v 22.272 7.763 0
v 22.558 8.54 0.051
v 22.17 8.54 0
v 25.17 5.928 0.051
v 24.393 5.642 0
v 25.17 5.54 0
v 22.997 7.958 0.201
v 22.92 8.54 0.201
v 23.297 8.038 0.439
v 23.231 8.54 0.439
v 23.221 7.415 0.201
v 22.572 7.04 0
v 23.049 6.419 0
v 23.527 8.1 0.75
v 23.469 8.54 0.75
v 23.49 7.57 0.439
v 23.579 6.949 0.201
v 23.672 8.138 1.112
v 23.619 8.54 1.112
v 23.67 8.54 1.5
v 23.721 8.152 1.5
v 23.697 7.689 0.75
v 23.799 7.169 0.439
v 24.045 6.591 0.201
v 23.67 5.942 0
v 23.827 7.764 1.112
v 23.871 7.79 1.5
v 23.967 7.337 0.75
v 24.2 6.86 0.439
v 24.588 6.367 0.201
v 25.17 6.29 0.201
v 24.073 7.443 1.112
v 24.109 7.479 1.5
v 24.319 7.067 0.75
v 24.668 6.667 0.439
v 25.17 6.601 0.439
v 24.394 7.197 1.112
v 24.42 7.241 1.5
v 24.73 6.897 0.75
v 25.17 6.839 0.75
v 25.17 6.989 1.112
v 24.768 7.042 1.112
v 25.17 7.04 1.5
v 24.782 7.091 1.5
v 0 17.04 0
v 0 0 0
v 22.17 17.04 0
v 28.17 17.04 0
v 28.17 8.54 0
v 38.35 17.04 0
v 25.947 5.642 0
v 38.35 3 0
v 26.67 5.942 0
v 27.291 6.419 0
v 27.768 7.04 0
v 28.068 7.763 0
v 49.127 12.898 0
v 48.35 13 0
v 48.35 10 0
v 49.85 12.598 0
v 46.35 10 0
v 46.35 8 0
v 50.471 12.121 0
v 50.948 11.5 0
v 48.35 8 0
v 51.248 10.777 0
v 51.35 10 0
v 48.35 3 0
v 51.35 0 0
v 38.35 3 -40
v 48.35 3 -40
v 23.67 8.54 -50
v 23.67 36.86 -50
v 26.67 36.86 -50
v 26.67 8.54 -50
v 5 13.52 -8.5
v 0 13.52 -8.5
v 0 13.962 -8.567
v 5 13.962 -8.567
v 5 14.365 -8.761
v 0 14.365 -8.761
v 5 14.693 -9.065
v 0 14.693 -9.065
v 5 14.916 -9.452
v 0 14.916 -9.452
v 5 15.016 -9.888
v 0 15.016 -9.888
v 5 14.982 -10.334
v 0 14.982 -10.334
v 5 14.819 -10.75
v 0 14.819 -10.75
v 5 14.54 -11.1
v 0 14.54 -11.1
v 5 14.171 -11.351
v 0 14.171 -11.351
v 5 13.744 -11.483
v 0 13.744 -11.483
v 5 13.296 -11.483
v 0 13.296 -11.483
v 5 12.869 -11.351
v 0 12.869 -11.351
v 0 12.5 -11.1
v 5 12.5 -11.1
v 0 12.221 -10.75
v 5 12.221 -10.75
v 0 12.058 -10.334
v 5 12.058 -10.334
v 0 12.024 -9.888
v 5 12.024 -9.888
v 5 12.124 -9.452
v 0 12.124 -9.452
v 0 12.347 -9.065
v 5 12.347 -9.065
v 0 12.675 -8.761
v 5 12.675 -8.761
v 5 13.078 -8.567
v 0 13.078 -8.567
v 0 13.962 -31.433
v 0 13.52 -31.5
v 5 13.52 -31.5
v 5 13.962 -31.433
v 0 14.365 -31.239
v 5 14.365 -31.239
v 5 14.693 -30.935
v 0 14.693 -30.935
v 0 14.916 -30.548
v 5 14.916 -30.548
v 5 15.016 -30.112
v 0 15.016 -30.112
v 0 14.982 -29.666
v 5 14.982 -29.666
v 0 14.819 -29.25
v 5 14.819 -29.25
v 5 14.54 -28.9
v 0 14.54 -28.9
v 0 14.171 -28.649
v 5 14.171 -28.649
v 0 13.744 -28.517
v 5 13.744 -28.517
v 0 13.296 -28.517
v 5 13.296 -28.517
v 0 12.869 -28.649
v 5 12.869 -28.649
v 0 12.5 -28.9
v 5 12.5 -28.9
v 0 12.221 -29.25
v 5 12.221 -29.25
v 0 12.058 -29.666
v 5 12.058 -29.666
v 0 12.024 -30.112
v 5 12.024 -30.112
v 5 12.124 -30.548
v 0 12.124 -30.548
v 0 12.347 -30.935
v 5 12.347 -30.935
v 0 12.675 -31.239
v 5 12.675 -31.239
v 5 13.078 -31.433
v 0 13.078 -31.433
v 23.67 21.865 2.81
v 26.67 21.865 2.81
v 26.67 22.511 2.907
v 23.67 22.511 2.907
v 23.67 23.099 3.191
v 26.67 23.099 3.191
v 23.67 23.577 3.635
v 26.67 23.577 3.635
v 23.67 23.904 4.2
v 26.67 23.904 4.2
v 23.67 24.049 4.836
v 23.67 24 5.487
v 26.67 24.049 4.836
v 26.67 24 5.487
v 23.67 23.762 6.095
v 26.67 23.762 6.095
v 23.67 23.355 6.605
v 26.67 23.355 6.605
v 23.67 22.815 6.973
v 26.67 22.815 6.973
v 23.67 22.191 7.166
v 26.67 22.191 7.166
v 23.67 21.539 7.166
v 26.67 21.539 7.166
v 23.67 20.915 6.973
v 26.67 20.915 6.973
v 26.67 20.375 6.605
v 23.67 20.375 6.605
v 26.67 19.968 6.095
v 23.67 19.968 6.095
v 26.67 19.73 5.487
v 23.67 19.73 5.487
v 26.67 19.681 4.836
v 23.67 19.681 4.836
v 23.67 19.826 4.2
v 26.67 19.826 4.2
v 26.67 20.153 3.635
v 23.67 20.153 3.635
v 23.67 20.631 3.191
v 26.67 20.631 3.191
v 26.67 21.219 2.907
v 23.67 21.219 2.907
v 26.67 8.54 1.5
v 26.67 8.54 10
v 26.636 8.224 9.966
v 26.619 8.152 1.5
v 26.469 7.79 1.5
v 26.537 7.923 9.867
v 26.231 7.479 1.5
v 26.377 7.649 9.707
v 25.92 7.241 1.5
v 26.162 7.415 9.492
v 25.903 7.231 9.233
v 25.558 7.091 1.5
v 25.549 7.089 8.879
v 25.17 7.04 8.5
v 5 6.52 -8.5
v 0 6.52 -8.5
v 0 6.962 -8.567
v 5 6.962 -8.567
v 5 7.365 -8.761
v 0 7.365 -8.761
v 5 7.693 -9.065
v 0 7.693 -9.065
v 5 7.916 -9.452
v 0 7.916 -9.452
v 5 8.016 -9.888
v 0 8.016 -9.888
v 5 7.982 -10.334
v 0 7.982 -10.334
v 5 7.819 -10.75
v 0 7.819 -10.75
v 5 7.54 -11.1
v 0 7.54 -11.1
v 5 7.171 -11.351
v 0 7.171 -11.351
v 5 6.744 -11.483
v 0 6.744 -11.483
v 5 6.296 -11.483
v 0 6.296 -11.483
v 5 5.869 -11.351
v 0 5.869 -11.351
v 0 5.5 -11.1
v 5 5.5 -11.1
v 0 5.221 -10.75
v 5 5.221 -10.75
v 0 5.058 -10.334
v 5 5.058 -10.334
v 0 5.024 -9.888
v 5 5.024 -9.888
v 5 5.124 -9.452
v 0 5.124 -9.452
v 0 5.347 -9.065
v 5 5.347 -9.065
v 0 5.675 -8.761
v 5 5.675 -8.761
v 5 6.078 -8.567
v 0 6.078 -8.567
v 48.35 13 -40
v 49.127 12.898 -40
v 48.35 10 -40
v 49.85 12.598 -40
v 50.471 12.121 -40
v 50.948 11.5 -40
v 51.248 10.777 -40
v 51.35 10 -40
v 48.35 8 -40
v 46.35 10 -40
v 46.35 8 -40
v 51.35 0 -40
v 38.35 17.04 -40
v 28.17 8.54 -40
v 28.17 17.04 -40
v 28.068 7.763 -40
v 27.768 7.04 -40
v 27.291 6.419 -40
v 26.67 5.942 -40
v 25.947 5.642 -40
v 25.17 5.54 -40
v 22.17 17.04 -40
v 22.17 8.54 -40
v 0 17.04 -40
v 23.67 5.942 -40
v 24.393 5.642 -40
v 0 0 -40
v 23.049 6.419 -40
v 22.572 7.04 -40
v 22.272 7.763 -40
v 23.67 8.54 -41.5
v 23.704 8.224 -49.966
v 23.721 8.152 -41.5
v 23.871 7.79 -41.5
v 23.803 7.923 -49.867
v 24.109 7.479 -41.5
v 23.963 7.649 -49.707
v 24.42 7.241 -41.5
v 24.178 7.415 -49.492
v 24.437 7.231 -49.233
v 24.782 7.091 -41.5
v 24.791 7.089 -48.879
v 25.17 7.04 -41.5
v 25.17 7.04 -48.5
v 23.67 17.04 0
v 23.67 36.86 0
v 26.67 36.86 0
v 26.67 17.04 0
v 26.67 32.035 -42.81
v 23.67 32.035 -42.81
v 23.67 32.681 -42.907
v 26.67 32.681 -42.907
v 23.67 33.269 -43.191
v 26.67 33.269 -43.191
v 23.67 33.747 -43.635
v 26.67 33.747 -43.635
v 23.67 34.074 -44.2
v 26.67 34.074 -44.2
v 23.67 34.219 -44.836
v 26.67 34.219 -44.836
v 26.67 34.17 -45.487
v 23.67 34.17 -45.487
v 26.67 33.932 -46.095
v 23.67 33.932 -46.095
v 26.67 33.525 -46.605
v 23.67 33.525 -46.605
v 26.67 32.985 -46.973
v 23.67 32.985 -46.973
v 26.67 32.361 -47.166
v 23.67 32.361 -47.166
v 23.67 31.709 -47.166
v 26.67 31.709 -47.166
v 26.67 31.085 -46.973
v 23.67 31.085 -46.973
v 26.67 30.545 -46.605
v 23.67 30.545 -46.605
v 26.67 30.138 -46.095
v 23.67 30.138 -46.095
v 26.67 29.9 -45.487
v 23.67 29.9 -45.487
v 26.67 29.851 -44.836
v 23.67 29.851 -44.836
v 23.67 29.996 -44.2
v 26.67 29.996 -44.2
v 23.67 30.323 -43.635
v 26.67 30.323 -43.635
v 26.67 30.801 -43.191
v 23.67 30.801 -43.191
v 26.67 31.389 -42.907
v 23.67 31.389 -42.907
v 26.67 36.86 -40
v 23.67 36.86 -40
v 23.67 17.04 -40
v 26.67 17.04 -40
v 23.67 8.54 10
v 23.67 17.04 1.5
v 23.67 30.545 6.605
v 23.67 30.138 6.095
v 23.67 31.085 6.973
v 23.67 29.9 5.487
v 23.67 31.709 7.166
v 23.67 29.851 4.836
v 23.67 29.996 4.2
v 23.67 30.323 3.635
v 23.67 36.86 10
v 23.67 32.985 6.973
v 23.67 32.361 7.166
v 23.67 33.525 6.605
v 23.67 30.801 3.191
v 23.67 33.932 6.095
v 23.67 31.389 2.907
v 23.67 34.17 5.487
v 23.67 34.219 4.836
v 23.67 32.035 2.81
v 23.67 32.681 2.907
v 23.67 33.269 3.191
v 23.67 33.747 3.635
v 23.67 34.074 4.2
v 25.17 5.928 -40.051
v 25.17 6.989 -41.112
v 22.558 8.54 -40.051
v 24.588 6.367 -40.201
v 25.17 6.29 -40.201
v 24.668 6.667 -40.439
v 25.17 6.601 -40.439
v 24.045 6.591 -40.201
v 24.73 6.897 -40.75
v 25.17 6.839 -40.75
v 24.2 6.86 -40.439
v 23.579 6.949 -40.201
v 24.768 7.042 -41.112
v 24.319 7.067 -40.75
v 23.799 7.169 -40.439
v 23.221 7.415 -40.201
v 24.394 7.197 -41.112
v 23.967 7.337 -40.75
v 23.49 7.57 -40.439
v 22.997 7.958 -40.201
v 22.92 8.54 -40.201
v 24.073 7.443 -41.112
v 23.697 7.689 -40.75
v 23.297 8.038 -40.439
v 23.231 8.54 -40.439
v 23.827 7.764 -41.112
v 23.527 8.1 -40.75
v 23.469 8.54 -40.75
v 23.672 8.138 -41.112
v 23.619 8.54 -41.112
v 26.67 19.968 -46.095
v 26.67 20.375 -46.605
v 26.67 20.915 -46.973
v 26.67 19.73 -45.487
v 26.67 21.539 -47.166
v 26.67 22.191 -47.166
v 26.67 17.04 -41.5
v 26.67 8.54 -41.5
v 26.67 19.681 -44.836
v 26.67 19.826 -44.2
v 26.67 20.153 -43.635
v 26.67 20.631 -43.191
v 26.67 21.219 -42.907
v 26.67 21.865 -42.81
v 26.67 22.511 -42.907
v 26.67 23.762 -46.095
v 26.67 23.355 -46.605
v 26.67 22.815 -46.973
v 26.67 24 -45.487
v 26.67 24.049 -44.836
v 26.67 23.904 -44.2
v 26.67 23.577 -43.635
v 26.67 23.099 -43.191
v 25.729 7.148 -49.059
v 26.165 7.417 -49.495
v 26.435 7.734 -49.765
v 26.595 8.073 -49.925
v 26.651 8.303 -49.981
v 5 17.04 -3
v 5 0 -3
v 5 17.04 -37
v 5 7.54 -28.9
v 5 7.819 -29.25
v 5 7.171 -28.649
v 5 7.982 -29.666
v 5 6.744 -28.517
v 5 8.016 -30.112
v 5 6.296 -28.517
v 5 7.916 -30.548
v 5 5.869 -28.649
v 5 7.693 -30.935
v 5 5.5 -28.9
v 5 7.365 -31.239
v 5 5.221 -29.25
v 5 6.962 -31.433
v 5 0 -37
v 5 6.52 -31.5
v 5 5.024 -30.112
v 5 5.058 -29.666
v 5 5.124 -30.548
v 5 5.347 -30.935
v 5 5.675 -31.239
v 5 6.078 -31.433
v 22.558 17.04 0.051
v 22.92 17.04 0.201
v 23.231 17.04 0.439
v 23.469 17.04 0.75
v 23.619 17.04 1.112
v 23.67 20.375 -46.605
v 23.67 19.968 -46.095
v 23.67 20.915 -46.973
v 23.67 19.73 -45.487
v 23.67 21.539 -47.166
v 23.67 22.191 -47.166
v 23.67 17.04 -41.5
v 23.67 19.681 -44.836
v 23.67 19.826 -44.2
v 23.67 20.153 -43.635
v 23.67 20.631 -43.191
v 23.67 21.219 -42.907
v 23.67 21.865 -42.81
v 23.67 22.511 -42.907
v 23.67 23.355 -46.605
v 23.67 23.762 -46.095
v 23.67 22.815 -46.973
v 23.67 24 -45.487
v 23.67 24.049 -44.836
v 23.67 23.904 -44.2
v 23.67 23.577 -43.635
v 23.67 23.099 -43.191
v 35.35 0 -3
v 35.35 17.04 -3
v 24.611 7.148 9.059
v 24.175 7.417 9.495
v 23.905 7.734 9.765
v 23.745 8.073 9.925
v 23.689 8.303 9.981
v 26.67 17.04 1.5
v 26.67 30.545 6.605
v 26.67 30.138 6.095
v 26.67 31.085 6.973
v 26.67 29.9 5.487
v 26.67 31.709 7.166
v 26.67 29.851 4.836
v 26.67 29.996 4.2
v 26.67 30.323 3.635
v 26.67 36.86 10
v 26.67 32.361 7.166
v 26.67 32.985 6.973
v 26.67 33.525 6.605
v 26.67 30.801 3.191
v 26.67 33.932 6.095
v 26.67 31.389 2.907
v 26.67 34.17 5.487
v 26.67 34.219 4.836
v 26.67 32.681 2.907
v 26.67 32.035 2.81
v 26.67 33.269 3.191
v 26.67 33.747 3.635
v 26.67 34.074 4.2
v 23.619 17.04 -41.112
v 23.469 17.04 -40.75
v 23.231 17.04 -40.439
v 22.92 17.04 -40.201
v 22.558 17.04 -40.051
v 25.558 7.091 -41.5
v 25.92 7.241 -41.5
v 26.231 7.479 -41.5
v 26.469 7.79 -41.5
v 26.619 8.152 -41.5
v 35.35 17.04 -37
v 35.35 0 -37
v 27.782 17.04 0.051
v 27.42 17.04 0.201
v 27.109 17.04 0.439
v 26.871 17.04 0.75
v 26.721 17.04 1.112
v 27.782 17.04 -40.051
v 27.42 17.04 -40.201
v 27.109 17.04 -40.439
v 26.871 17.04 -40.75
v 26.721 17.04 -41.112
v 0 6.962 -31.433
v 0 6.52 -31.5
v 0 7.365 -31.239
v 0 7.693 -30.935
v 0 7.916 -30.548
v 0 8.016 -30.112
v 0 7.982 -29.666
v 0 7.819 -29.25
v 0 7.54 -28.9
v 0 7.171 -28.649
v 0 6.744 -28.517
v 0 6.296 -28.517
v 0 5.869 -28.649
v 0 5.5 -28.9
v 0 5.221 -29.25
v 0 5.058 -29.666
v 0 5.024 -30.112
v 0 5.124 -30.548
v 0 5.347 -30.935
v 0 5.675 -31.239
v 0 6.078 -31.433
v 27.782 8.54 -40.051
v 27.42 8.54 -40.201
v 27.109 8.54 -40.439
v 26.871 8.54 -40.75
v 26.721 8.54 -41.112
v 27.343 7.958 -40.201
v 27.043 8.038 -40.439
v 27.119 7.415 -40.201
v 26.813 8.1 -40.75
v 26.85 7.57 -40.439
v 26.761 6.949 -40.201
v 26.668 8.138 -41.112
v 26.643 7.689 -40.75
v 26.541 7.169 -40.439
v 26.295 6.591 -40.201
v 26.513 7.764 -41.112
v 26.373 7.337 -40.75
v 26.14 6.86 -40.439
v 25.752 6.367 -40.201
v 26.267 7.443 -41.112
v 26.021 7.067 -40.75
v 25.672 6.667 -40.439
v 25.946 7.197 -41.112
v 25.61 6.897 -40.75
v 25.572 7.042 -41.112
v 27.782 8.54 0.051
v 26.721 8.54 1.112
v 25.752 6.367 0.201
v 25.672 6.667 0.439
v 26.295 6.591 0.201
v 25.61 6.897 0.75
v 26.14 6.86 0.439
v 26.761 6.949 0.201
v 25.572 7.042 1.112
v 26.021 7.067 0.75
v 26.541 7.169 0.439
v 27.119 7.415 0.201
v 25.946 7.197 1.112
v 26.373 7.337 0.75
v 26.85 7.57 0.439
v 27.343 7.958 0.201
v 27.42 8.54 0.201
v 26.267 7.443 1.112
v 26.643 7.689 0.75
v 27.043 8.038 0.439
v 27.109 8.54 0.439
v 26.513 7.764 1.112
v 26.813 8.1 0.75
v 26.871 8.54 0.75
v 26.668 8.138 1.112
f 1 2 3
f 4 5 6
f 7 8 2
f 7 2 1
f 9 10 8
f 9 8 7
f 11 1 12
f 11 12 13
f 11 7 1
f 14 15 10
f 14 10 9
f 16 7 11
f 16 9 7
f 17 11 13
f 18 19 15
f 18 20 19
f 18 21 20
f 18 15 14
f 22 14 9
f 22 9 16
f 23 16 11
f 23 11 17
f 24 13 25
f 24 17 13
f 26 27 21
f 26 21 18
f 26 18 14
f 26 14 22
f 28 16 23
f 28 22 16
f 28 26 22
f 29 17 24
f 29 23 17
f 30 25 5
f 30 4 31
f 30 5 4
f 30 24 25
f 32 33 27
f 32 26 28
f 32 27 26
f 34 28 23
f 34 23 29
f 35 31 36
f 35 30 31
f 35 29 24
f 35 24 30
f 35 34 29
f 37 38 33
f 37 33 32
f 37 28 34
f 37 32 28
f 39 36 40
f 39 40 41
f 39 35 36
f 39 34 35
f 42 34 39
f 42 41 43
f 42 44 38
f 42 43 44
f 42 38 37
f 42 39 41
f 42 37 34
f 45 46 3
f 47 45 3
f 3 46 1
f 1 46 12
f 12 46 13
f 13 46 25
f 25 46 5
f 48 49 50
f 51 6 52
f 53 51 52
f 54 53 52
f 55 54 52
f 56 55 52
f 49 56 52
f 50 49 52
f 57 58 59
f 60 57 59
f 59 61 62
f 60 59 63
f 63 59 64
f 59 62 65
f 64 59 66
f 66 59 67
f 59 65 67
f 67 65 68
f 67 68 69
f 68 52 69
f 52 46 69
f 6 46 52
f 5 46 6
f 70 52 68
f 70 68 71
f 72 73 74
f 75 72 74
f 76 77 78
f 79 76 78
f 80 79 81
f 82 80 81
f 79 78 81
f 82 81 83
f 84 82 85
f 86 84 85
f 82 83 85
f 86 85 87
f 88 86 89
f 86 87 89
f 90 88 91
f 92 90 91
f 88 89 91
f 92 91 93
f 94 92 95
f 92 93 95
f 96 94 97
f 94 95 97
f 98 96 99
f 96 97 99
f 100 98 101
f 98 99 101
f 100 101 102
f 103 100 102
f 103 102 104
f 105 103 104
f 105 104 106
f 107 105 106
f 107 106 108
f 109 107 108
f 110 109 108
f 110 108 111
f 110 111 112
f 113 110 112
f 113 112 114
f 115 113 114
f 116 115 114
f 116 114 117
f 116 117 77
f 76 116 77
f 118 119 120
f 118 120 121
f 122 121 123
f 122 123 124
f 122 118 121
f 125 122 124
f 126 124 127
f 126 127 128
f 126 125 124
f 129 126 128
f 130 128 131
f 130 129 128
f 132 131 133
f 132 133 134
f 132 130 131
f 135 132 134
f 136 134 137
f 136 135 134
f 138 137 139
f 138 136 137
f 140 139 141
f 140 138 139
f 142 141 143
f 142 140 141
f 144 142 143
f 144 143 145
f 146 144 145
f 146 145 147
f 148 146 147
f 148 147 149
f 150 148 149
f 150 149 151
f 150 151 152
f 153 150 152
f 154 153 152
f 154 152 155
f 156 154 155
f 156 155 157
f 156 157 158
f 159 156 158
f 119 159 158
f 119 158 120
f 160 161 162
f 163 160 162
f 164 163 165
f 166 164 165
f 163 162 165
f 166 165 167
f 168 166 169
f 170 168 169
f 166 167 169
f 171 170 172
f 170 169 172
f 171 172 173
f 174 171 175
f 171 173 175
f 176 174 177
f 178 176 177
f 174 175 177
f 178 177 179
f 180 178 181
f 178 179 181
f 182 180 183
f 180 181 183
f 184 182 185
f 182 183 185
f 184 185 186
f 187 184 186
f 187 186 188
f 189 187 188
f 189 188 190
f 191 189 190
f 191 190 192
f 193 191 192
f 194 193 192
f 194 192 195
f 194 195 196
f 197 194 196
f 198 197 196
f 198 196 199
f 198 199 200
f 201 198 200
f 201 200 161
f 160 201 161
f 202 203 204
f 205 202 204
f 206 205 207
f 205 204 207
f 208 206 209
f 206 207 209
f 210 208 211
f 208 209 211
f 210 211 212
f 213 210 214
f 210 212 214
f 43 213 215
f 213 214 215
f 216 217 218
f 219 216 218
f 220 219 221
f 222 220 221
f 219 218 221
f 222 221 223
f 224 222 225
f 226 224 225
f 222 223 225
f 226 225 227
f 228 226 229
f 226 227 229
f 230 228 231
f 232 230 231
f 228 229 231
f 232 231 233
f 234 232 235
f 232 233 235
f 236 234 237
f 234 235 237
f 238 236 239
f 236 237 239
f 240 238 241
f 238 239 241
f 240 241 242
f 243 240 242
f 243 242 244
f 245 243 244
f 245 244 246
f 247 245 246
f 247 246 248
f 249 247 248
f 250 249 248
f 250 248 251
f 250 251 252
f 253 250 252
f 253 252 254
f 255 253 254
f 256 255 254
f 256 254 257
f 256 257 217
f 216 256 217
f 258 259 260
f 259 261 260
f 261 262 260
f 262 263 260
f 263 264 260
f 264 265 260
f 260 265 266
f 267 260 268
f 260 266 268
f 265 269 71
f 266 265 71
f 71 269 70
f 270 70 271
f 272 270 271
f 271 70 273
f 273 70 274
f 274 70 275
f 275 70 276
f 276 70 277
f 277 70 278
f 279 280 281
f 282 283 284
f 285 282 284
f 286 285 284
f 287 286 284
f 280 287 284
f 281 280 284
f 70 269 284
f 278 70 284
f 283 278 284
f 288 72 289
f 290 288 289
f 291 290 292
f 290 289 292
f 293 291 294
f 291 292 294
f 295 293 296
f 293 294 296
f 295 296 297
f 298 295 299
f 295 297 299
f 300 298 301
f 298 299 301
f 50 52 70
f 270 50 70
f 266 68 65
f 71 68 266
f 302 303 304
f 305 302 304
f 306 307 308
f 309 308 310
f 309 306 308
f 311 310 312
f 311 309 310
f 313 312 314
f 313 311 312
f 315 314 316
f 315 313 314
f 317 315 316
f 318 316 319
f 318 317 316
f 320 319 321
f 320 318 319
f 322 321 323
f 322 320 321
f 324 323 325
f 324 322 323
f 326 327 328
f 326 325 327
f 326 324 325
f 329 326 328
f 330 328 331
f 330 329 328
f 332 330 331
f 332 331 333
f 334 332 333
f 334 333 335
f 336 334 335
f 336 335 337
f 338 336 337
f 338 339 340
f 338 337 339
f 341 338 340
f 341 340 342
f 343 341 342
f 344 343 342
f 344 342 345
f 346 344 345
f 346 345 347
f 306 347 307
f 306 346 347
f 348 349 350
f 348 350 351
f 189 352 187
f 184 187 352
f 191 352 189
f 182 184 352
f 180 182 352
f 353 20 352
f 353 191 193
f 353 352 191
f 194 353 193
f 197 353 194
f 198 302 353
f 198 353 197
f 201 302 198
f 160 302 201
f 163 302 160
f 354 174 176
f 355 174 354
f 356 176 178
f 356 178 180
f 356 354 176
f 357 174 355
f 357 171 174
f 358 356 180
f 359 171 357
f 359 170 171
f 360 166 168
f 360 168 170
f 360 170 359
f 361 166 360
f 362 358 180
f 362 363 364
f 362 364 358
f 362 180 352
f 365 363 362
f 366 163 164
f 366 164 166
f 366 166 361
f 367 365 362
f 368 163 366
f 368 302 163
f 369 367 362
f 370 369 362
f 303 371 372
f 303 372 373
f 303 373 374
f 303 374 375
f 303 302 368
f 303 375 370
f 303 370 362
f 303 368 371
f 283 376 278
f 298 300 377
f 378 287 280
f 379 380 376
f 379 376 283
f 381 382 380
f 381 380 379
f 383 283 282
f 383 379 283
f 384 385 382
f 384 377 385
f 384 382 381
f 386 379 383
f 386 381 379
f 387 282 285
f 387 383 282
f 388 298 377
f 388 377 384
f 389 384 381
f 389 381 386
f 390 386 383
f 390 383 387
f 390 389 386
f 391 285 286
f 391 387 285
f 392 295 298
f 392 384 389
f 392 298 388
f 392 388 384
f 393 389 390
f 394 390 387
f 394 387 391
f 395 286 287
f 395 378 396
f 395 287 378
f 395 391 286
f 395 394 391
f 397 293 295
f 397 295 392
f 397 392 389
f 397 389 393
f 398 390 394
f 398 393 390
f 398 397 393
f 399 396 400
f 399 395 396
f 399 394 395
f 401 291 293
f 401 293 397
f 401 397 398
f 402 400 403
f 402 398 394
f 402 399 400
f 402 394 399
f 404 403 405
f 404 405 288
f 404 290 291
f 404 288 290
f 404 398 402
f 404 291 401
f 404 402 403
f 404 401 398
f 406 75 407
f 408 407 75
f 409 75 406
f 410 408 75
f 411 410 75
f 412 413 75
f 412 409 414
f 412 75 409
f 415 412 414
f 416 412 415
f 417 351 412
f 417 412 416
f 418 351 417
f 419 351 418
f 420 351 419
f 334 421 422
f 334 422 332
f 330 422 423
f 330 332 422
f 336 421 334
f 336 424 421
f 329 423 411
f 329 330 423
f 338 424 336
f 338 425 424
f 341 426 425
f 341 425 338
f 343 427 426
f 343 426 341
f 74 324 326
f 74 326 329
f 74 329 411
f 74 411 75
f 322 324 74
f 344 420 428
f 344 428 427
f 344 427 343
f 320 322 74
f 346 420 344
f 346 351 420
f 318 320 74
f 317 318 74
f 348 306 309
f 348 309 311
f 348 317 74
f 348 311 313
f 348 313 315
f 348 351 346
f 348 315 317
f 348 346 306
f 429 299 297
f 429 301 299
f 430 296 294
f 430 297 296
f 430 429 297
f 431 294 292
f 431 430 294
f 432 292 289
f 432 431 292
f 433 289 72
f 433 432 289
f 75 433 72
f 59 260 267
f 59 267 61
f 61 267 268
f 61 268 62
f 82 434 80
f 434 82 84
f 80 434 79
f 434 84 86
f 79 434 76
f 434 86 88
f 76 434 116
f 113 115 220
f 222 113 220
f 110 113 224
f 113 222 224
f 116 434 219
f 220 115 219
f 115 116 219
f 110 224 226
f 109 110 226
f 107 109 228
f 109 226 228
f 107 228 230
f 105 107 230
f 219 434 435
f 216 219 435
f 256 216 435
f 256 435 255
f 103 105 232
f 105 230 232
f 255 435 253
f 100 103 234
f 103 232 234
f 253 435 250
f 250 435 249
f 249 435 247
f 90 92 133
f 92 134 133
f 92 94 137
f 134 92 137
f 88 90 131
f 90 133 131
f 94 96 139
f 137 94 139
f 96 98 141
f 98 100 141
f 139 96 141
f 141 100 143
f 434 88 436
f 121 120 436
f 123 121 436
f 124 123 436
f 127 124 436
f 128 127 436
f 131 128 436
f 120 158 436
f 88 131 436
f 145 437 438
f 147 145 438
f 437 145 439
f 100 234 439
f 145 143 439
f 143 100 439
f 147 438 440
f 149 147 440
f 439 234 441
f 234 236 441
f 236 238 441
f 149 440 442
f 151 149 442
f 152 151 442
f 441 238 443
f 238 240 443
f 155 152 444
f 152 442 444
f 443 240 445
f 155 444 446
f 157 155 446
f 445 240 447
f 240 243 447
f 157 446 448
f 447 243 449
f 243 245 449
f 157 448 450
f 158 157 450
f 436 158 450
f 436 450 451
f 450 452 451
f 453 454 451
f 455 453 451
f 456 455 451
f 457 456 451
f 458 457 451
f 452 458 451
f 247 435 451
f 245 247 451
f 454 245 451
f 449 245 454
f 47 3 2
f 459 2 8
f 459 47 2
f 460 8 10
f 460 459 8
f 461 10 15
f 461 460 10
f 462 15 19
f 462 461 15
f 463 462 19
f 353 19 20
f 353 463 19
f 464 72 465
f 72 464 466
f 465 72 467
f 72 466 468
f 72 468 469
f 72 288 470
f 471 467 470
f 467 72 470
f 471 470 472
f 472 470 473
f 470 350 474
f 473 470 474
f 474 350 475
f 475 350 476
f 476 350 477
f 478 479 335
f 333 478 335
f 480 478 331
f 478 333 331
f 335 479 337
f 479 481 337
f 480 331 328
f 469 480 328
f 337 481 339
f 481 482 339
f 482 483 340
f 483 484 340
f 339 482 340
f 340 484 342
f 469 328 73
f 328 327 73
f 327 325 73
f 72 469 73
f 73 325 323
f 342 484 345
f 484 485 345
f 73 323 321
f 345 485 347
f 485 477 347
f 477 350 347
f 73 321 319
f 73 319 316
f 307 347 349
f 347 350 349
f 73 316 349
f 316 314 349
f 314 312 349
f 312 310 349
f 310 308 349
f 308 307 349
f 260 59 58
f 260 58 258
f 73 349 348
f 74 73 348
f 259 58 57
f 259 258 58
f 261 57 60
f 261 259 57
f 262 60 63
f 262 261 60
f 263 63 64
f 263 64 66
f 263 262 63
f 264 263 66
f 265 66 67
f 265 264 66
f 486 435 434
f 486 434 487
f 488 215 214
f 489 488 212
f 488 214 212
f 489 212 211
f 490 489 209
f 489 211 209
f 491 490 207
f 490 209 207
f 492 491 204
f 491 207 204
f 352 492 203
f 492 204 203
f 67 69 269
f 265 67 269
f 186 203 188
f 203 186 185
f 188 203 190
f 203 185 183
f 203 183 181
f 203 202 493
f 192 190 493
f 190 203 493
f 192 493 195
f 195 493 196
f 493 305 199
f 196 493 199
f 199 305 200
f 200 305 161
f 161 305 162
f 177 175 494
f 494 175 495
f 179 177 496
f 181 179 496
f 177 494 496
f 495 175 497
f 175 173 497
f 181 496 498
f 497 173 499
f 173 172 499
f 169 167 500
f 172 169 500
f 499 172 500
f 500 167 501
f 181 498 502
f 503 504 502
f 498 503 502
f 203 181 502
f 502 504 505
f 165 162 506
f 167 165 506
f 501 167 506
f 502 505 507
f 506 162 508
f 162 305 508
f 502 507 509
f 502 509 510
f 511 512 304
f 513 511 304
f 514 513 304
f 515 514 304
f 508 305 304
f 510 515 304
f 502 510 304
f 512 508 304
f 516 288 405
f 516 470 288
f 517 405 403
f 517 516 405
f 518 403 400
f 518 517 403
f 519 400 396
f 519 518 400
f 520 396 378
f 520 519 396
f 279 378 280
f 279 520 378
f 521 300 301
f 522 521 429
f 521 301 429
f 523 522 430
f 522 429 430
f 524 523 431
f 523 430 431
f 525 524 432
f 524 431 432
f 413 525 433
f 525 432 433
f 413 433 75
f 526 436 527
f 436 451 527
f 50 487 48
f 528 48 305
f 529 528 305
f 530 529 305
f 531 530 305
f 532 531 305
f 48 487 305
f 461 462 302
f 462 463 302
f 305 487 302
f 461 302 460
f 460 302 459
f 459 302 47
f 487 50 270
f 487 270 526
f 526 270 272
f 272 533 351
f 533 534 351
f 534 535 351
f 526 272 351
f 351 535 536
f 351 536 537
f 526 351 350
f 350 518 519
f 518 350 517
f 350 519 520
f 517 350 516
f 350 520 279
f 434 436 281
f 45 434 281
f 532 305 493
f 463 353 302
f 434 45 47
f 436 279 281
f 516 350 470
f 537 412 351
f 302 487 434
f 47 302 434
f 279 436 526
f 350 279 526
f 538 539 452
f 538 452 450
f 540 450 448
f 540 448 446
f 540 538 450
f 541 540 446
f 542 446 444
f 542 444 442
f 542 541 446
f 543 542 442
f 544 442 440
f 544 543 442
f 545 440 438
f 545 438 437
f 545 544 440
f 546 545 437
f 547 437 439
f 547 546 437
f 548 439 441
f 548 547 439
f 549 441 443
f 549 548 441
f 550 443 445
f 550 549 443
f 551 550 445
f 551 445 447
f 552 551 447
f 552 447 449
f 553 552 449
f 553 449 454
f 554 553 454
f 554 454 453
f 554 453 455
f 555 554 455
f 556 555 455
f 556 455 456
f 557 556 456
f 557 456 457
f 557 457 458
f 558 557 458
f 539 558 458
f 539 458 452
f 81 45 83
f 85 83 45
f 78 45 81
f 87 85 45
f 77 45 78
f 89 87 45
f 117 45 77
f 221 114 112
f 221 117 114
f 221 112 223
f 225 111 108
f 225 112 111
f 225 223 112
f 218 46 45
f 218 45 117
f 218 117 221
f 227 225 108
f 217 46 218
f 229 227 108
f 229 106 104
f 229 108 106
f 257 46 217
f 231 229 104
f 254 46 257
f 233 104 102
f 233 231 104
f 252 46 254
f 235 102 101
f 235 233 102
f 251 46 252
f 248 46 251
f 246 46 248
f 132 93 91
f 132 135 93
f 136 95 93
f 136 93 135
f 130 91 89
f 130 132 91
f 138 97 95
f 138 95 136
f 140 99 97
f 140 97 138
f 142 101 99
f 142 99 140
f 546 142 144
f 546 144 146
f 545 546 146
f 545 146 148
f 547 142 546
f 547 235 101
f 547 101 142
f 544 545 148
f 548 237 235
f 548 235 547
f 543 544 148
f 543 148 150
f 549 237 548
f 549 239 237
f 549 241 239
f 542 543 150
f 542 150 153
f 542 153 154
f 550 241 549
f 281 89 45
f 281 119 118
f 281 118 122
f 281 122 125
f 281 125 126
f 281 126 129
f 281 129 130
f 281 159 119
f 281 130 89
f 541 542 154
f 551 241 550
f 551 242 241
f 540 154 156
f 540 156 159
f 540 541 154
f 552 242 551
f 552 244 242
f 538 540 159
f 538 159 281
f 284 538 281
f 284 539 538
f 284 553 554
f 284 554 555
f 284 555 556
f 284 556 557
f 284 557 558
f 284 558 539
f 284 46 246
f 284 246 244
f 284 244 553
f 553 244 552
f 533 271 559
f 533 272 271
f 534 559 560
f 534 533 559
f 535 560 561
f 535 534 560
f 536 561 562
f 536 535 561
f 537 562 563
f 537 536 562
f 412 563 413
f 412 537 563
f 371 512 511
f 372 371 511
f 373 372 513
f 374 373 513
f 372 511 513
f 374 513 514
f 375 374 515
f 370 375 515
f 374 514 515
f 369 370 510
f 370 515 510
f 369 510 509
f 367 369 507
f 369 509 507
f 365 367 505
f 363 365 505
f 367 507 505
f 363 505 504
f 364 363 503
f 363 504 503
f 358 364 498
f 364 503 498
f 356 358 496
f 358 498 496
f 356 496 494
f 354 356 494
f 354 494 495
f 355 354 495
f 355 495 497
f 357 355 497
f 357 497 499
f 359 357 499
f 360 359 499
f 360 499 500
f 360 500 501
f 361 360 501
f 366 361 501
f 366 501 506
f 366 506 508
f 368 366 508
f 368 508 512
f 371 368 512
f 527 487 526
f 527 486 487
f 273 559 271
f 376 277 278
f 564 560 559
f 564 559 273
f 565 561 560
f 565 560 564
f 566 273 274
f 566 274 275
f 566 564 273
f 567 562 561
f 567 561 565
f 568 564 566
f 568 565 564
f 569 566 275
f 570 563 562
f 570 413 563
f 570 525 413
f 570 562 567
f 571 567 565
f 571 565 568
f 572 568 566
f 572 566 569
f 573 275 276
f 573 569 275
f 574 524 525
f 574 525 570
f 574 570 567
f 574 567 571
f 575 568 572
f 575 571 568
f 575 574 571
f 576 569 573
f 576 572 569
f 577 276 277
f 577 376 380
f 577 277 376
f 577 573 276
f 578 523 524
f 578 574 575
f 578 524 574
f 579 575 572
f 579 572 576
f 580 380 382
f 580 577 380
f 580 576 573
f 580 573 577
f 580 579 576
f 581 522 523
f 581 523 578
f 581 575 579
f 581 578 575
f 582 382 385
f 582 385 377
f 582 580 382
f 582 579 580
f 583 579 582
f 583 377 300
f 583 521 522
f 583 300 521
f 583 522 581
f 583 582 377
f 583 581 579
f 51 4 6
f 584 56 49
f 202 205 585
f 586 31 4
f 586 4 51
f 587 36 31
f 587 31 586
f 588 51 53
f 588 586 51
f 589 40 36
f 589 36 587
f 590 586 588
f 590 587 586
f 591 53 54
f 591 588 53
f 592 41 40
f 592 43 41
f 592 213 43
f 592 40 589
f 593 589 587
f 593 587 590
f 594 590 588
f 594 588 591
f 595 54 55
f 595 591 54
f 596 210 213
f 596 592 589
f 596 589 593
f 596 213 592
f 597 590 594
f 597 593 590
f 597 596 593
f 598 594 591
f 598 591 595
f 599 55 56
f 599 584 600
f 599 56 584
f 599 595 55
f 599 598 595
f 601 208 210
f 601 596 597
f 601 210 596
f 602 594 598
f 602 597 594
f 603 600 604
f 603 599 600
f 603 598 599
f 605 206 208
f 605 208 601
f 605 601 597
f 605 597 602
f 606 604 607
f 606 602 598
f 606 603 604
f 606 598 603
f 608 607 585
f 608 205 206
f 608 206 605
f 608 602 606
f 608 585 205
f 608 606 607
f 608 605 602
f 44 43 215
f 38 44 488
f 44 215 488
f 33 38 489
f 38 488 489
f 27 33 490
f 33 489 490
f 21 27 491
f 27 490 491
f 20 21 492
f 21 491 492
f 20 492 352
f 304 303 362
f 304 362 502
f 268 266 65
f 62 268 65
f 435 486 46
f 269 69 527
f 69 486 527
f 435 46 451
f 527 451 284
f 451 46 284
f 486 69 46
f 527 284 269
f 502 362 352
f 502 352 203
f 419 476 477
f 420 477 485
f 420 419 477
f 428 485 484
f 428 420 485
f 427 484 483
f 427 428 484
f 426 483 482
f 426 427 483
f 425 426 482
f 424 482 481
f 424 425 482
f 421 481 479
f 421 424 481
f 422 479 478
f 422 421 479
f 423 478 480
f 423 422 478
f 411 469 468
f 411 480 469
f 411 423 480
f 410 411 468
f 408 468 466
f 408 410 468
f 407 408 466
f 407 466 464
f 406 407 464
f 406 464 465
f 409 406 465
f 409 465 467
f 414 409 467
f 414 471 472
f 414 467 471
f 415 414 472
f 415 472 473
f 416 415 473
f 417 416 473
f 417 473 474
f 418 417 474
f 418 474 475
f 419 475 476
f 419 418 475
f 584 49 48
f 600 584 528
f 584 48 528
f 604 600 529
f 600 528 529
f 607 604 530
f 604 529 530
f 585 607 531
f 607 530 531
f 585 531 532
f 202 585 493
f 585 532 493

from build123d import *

# Parameters (mm, degrees)
SKETCH1_W           = 40
SKETCH1_H           = 3
BOSS_EXTRUDE1_DEPTH = 51.35
SKETCH2_W           = 3
SKETCH2_H           = 40
BOSS_EXTRUDE2_DEPTH = 10
FILLET1_R           = 3
SKETCH3_W           = 40
SKETCH3_H           = 2
BOSS_EXTRUDE3_DEPTH = 2
SKETCH4_W           = 30.35
SKETCH4_H           = 34
BOSS_EXTRUDE4_DEPTH = 14.04
SKETCH5_W           = 3
SKETCH5_H           = 29.82
BOSS_EXTRUDE5_DEPTH = 10
FILLET3_R           = 1.5
SKETCH6_R           = 2.19
CUT_EXTRUDE1_DEPTH  = 68.601394216
CUT_EXTRUDE2_REACH  = 82.595
SKETCH7_R           = 1.5
SKETCH8_W           = 30.35
SKETCH8_H           = 34
CUT_EXTRUDE3_DEPTH  = 3


with BuildPart() as part:
    # Sketch1 → Boss-Extrude1 (new body)
    with BuildSketch(Plane(origin=(0, 0, 0), x_dir=(0, 0, -1), z_dir=(1, 0, 0))):
        with Locations((20, 1.5)):
            Rectangle(SKETCH1_W, SKETCH1_H)
    extrude(amount=BOSS_EXTRUDE1_DEPTH)

    # Sketch2 → Boss-Extrude2 (add)
    with BuildSketch(Plane(origin=(0, 3, 0), x_dir=(1, 0, 0), z_dir=(0, 1, 0))):
        with Locations((49.85, 20)):
            Rectangle(SKETCH2_W, SKETCH2_H)
    extrude(amount=BOSS_EXTRUDE2_DEPTH)

    # Fillet1
    fillet1_edges = [part.edges().sort_by_distance(p)[0] for p in [
        (51.35, 13, -20),
    ]]
    fillet(fillet1_edges, radius=FILLET1_R - 0.0001)  # a hair under: the kernel refuses the full size

    # Sketch3 → Boss-Extrude3 (add)
    with BuildSketch(Plane.ZY.offset(-48.35)):
        with Locations((-20, 9)):
            Rectangle(SKETCH3_W, SKETCH3_H)
    extrude(amount=BOSS_EXTRUDE3_DEPTH)

    # Sketch4 → Boss-Extrude4 (add)
    with BuildSketch(Plane(origin=(0, 3, 0), x_dir=(1, 0, 0), z_dir=(0, 1, 0))):
        Polygon((0, 40), (3, 40), (38.35, 40), (38.35, 37), (38.35, 3), (38.35, 0), (3, 0), (0, 0), align=None)
        with Locations((20.175, 20)):
            Rectangle(SKETCH4_W, SKETCH4_H, mode=Mode.SUBTRACT)
    extrude(amount=BOSS_EXTRUDE4_DEPTH)

    # Sketch5 → Boss-Extrude5 (add)
    with BuildSketch(Plane.XY):
        with Locations((25.17, 21.95)):
            Rectangle(SKETCH5_W, SKETCH5_H)
    boss_extrude5 = extrude(amount=BOSS_EXTRUDE5_DEPTH)

    # Mirror2: Boss-Extrude5 across plane
    add(boss_extrude5.mirror(Plane(origin=(0, 0, -20), x_dir=(1, 0, 0), z_dir=(0, 0, -1))))

    # Fillet3
    fillet3_edges = [part.edges().sort_by_distance(p)[0] for p in [
        (23.67, 12.04, 0),
        (25.17, 7.04, 0),
        (23.67, 7.04, 5),
        (26.67, 12.04, 0),
        (26.67, 7.04, 5),
        (25.17, 7.04, 10),
        (23.67, 12.04, -40),
        (23.67, 7.04, -45),
        (25.17, 7.04, -50),
        (26.67, 7.04, -45),
        (26.67, 12.04, -40),
        (25.17, 7.04, -40),
    ]]
    fillet(fillet3_edges, radius=FILLET3_R - 0.0001)  # a hair under: the kernel refuses the full size

    # Sketch6 → Cut-Extrude1 (cut, through all)
    with BuildSketch(Plane(origin=(26.67, 0, 0), x_dir=(0, 0, -1), z_dir=(1, 0, 0))):
        with Locations((-5, 32.035)):
            Circle(SKETCH6_R)
        with Locations((-5, 21.865)):
            Circle(SKETCH6_R)
    cut_extrude1 = extrude(amount=-CUT_EXTRUDE1_DEPTH, mode=Mode.SUBTRACT)

    # Mirror3: Cut-Extrude1 across plane
    add(cut_extrude1.mirror(Plane(origin=(0, 0, -20), x_dir=(1, 0, 0), z_dir=(0, 0, -1))), mode=Mode.SUBTRACT)

    # Sketch7 → Cut-Extrude2 (cut, up to next)
    with BuildSketch(Plane.ZY, mode=Mode.PRIVATE) as cut_extrude2_sk1:
        with Locations((-10, 13.52)):
            Circle(SKETCH7_R)
    cut_extrude2_tool1 = extrude(cut_extrude2_sk1.sketch, amount=-CUT_EXTRUDE2_REACH, mode=Mode.PRIVATE) & part.part
    # Sketch7 → Cut-Extrude2 (cut, up to next)
    with BuildSketch(Plane.ZY, mode=Mode.PRIVATE) as cut_extrude2_sk2:
        with Locations((-10, 6.52)):
            Circle(SKETCH7_R)
    cut_extrude2_tool2 = extrude(cut_extrude2_sk2.sketch, amount=-CUT_EXTRUDE2_REACH, mode=Mode.PRIVATE) & part.part
    cut_extrude2_1 = cut_extrude2_tool1.solids().sort_by_distance((0, 13.52, -10))[0]
    add(cut_extrude2_1, mode=Mode.SUBTRACT)
    cut_extrude2_2 = cut_extrude2_tool2.solids().sort_by_distance((0, 6.52, -10))[0]
    add(cut_extrude2_2, mode=Mode.SUBTRACT)
    cut_extrude2 = cut_extrude2_1 + cut_extrude2_2  # Cut-Extrude2 as one shape, for the pattern or mirror that repeats it

    # Mirror4: Cut-Extrude2 across plane
    add(cut_extrude2.mirror(Plane(origin=(0, 0, -20), x_dir=(1, 0, 0), z_dir=(0, 0, -1))), mode=Mode.SUBTRACT)

    # Sketch8 → Cut-Extrude3 (cut)
    with BuildSketch(Plane(origin=(0, 3, 0), x_dir=(1, 0, 0), z_dir=(0, 1, 0))):
        with Locations((20.175, 20)):
            Rectangle(SKETCH8_W, SKETCH8_H)
    extrude(amount=-CUT_EXTRUDE3_DEPTH, mode=Mode.SUBTRACT)


solid = part.part
